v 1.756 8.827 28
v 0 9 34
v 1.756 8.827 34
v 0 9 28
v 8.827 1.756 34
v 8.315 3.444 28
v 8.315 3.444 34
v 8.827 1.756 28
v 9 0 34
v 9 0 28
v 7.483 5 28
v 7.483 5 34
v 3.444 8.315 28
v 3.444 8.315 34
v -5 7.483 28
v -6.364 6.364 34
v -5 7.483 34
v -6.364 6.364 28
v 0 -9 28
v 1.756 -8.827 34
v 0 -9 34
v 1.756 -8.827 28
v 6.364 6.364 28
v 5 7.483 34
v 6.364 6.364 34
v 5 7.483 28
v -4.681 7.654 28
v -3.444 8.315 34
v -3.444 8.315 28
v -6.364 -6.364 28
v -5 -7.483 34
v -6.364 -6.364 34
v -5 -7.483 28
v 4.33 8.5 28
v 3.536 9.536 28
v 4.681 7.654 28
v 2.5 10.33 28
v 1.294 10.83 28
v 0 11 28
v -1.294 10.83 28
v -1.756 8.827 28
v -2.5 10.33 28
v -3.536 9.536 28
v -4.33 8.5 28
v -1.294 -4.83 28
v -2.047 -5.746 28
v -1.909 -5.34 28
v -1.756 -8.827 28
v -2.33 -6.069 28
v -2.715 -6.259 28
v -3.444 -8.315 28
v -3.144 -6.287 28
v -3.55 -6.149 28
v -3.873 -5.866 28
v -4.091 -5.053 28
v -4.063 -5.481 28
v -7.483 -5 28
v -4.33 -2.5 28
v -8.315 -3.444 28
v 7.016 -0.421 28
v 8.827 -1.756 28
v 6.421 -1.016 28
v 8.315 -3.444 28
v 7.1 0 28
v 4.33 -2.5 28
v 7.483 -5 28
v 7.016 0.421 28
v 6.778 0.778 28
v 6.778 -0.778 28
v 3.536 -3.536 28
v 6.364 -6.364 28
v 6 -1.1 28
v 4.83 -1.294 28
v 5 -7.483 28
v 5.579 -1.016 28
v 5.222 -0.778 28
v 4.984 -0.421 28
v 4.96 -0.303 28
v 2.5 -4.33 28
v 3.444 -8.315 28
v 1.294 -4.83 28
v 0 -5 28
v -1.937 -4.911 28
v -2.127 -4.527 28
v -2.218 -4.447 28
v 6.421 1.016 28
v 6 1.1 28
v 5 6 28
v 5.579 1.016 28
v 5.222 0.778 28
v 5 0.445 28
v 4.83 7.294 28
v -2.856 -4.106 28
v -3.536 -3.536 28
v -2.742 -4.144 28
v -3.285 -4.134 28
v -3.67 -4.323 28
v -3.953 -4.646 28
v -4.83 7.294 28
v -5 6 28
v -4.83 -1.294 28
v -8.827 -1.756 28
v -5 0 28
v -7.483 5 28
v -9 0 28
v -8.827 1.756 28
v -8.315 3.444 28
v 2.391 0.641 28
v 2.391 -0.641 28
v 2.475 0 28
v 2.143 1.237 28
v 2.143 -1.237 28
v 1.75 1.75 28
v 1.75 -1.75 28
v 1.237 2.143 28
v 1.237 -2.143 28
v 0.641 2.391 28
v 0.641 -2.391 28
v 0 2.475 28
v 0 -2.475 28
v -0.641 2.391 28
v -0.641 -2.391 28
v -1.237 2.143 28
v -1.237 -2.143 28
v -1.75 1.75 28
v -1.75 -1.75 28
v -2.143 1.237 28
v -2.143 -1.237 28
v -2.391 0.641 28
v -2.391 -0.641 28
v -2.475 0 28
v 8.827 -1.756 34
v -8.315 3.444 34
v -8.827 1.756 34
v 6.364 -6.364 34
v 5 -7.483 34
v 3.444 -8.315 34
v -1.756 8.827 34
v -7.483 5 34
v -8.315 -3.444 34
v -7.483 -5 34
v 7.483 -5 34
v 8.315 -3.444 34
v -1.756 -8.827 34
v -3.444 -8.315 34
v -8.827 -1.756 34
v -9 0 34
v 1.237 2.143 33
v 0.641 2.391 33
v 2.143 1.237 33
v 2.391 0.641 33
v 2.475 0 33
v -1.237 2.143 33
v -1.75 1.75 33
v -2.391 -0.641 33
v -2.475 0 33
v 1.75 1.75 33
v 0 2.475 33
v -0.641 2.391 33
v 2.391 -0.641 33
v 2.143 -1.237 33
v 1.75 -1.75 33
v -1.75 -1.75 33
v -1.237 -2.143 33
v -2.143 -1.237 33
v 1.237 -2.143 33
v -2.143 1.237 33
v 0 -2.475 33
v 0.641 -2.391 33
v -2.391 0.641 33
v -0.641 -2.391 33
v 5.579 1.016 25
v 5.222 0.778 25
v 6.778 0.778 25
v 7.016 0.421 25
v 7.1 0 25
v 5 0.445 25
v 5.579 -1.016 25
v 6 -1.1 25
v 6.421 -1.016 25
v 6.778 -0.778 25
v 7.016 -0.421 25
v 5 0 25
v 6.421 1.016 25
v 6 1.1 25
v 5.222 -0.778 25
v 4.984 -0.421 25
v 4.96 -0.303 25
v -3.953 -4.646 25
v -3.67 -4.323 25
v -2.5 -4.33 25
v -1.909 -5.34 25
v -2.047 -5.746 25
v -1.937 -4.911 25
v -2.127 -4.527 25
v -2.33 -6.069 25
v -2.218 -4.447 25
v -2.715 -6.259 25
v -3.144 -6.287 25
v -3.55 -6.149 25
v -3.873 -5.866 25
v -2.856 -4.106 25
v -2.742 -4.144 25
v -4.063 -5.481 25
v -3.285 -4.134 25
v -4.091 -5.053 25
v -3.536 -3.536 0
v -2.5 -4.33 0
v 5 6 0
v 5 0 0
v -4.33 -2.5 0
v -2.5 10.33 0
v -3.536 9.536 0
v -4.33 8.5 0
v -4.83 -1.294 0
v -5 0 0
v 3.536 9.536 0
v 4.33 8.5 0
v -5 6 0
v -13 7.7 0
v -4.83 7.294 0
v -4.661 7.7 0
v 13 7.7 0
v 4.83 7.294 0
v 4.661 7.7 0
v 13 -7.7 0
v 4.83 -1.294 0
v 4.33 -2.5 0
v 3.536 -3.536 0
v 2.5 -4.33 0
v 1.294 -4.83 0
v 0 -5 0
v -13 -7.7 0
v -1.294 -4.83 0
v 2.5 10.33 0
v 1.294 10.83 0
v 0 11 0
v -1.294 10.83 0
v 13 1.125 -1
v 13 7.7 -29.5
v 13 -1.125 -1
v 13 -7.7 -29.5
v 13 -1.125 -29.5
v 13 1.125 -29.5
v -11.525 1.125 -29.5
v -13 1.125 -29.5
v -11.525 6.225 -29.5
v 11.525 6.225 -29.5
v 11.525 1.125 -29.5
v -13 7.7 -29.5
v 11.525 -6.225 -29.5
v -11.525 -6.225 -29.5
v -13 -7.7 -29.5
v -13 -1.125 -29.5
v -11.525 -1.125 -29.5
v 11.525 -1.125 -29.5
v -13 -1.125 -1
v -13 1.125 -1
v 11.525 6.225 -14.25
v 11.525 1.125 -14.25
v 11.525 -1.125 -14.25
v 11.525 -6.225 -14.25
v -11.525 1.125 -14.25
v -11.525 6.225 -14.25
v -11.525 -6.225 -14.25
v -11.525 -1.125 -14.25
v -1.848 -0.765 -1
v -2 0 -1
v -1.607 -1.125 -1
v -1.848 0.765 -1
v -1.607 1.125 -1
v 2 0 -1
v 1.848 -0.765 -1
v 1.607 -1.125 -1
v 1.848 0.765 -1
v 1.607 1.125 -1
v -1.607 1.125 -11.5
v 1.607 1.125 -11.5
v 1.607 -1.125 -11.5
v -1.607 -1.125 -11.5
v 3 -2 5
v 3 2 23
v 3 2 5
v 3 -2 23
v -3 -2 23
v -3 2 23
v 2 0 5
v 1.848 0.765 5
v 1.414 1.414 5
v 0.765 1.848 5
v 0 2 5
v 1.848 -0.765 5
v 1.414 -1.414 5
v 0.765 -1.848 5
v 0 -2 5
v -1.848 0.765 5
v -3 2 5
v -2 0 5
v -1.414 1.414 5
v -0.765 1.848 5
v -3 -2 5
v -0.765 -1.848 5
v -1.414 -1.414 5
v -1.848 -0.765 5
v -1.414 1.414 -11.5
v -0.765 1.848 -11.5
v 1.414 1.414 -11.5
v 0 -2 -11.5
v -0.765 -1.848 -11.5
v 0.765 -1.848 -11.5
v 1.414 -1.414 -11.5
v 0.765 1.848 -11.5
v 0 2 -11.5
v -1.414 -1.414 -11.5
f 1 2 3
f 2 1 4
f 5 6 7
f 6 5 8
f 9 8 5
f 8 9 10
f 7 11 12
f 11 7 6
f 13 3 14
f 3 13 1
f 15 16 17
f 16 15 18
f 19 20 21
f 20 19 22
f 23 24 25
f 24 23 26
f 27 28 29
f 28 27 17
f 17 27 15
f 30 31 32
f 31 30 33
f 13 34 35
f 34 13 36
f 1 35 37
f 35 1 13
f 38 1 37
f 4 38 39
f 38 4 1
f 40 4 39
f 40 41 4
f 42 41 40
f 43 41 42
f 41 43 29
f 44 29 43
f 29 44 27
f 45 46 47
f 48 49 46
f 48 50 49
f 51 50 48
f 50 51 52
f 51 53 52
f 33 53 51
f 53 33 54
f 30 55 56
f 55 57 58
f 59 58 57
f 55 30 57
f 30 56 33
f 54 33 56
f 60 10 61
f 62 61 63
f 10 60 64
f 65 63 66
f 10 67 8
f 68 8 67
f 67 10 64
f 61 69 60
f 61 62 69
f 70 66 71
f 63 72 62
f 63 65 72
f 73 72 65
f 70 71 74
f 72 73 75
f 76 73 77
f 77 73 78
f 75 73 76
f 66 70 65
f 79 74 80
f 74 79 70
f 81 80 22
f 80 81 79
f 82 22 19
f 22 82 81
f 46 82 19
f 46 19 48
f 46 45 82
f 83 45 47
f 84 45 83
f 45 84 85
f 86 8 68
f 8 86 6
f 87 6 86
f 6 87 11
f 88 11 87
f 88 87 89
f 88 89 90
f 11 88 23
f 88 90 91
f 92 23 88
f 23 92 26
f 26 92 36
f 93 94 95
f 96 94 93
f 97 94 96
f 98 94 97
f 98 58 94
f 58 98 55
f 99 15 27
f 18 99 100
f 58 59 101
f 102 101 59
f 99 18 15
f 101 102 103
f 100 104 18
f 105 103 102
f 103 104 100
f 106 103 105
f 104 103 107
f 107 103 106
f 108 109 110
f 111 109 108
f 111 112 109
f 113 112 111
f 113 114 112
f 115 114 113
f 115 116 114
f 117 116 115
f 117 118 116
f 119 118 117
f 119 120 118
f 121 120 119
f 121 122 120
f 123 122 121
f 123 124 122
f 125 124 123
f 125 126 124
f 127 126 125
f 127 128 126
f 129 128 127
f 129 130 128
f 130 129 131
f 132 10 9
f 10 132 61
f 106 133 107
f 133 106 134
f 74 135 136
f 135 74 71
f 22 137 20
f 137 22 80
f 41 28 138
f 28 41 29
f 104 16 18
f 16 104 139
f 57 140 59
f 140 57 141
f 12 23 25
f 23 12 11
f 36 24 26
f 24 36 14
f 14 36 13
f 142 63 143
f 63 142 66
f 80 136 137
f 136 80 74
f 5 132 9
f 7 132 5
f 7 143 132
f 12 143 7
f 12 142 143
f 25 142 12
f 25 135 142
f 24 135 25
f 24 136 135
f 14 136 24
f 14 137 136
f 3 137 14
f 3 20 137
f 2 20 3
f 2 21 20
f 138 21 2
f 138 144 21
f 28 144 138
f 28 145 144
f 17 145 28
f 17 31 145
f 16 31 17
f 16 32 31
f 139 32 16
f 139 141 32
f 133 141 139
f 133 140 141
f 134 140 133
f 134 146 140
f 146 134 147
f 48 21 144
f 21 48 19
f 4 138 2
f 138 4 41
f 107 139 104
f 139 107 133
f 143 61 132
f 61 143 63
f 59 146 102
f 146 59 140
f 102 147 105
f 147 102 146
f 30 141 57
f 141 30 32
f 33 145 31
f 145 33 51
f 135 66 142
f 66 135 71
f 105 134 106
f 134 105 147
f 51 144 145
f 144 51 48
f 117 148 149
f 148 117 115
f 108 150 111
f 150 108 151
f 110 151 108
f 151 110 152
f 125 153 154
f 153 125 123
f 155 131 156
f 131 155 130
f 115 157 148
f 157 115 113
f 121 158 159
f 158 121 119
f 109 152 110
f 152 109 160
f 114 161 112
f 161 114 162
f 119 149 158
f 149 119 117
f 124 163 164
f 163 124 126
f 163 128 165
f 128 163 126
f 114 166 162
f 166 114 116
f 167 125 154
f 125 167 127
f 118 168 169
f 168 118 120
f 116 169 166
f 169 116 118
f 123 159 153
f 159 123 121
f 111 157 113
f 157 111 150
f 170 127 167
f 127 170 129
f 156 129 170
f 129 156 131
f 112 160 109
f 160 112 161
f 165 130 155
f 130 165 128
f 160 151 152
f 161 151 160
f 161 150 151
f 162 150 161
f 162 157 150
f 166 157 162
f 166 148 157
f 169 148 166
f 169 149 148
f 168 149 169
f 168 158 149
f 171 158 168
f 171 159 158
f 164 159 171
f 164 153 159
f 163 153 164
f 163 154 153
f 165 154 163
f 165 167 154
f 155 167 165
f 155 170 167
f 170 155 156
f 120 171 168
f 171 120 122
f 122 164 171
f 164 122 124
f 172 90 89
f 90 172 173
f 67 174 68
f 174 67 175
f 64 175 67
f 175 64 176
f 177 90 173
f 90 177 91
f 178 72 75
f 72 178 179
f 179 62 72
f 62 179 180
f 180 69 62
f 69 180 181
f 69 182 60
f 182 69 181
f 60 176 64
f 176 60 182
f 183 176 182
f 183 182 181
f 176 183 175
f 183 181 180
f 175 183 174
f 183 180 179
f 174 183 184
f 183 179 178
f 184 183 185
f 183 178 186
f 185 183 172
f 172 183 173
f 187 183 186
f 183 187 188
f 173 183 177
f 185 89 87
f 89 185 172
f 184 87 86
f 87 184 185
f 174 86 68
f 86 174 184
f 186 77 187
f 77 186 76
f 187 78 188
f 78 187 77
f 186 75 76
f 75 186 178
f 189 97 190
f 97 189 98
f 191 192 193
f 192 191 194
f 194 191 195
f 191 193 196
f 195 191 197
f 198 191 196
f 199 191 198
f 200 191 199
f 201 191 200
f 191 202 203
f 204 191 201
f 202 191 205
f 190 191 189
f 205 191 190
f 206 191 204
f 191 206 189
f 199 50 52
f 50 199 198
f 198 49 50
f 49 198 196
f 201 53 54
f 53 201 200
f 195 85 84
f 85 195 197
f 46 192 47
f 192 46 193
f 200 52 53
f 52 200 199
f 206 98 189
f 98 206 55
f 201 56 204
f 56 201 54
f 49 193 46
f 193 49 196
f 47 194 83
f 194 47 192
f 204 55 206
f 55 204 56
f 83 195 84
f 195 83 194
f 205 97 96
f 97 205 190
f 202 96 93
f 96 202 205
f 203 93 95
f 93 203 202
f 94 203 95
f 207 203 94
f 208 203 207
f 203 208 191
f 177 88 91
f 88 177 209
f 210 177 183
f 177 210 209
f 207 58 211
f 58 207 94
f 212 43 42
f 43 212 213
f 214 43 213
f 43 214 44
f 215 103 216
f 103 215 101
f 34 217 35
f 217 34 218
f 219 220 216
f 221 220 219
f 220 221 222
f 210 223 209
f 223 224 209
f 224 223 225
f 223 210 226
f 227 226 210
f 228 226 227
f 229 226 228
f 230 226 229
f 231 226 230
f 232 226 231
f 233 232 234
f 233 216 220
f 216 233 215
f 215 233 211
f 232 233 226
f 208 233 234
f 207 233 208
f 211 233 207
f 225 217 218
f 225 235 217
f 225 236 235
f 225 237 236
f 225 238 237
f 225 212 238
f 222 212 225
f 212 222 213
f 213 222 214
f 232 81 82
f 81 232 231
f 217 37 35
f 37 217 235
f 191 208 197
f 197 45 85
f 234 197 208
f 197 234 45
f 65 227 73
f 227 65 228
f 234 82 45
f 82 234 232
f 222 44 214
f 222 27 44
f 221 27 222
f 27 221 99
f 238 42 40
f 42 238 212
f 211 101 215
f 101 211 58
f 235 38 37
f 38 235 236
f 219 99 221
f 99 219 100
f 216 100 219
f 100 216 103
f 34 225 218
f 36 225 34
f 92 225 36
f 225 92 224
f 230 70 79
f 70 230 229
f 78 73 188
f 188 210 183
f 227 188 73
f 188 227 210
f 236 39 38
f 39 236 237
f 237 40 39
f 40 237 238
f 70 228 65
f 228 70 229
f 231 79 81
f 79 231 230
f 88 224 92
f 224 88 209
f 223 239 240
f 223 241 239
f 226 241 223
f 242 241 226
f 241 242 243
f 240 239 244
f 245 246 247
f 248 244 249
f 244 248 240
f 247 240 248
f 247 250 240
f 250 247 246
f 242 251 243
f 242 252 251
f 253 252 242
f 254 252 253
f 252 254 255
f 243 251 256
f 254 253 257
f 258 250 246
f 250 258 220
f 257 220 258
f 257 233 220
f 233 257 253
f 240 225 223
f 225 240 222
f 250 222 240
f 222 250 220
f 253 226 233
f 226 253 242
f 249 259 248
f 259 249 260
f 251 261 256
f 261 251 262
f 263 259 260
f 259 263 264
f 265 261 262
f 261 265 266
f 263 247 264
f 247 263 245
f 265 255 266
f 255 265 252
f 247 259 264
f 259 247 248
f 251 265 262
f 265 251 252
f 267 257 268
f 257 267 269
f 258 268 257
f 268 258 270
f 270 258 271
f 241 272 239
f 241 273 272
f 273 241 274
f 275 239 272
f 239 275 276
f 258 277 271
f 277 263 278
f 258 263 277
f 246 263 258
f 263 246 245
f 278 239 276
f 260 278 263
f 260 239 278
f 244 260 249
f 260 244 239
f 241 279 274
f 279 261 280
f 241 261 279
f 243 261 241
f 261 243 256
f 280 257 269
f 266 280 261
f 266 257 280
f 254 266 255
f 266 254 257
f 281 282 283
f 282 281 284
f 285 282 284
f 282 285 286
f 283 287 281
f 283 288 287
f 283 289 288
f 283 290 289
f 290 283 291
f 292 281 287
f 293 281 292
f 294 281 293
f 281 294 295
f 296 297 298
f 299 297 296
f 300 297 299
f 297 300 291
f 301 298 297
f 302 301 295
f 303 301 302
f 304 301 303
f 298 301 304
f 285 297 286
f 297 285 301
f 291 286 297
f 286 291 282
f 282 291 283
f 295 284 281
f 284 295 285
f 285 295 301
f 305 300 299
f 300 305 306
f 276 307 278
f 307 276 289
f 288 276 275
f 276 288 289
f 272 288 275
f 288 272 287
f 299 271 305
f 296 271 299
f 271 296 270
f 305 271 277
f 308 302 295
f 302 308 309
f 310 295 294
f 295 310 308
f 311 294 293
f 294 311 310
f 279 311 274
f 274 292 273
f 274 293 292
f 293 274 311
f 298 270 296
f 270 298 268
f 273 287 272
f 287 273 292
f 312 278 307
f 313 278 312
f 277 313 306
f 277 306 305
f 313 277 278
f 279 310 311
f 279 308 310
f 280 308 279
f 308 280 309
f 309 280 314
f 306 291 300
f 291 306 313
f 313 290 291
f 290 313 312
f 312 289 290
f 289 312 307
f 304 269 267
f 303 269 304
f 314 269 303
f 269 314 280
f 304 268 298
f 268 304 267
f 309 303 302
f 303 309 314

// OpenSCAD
// file: config.scad
// PenguinBot - Print Configuration & Shared Utilities
// Units: mm | Tolerance for 3D printed parts

// ===== Print Parameters =====
LAYER_HEIGHT = 0.12;  // Appearance parts
WALL_THICKNESS = 1.6; // 3 perimeters @ 0.4mm nozzle → 1.2mm, add safety margin
CLEARANCE = 0.15;     // Hole compensation for FDM
TIGHT_FIT = 0.05;     // Press-fit tolerance
SLIP_FIT = 0.25;      // Sliding fit tolerance

// ===== MG90S Servo Dimensions =====
SERVO_BODY_W = 22.8;
SERVO_BODY_H = 12.2;
SERVO_BODY_D = 29.5;
SERVO_FLANGE_W = 32.2;
SERVO_FLANGE_H = 2.0;
SERVO_MOUNT_HOLE_SPACING = 27.0;
SERVO_MOUNT_HOLE_D = 2.0 + CLEARANCE;
SERVO_SPLINE_D = 4.8;
SERVO_SPLINE_OFFSET = 10.0;  // Spline center from top edge

// ===== N20 Motor Dimensions =====
N20_BODY_D = 24.4;
N20_BODY_L = 13.0;
N20_GEARBOX_D = 24.4;
N20_GEARBOX_L = 12.0;
N20_SHAFT_D = 3.0;
N20_SHAFT_L = 12.0;
N20_MOUNT_HOLE_SPACING = 17.0;
N20_MOUNT_HOLE_D = 2.5;

// ===== AS5600 Encoder =====
AS5600_PCB_W = 16.0;
AS5600_PCB_H = 12.7;
AS5600_PCB_T = 1.6;
MAGNET_D = 6.0;
MAGNET_H = 2.0;

// ===== Display =====
TFT_DISPLAY_W = 31.5;
TFT_DISPLAY_H = 43.5;
TFT_DISPLAY_T = 2.5;
TFT_ACTIVE_W = 24.0;
TFT_ACTIVE_H = 32.0;
TFT_PCB_W = 36.0;
TFT_PCB_H = 52.0;

// ===== Battery 2S 1500mAh (typical) =====
BATTERY_W = 35.0;
BATTERY_H = 18.0;
BATTERY_D = 70.0;

// ===== General Dimensions =====
BODY_W = 60.0;
BODY_D = 45.0;
BODY_H = 55.0;
HEAD_DIAMETER = 55.0;
HEAD_H = 40.0;
LEG_UPPER_L = 28.0;
LEG_LOWER_L = 32.0;
WHEEL_DIAMETER = 45.0;
WHEEL_WIDTH = 12.0;
ROBOT_TOTAL_H = 155.0;

// M2 / M3 fastener clearances
M2_CLEAR = 2.2;
M2_TAP = 1.6;
M2_NUT_D = 4.5;
M2_NUT_H = 1.8;
M3_CLEAR = 3.3;
M3_TAP = 2.5;

// ===== Utility Modules =====
module servo_cutout() {
    // Main body
    translate([0, 0, -SERVO_BODY_D/2])
        cube([SERVO_BODY_W + SLIP_FIT, SERVO_BODY_H + SLIP_FIT, SERVO_BODY_D + 1], center=true);
    // Flange
    translate([0, 0, -SERVO_FLANGE_H/2])
        cube([SERVO_FLANGE_W + SLIP_FIT, SERVO_FLANGE_H + SLIP_FIT, SERVO_BODY_D], center=true);
    // Mounting holes
    for (x = [-1, 1])
        translate([x * SERVO_MOUNT_HOLE_SPACING/2, 0, -SERVO_BODY_D/2])
            cylinder(d=SERVO_MOUNT_HOLE_D, h=SERVO_BODY_D + 2, center=true, $fn=16);
}

module n20_cutout() {
    union() {
        // Motor body
        cylinder(d=N20_BODY_D + SLIP_FIT, h=N20_BODY_L + 1, center=true, $fn=32);
        // Gearbox
        translate([0, 0, N20_BODY_L/2 + N20_GEARBOX_L/2])
            cylinder(d=N20_GEARBOX_D + SLIP_FIT, h=N20_GEARBOX_L + 0.5, center=true, $fn=32);
        // Mount holes
        for (x = [-1, 1])
            translate([x * N20_MOUNT_HOLE_SPACING/2, 0, 0])
                cylinder(d=N20_MOUNT_HOLE_D + CLEARANCE, h=30, center=true, $fn=16);
    }
}

// counterbore for M2 flat head screw
module m2_counterbore(length=10) {
    union() {
        cylinder(d=M2_CLEAR, h=length, center=false, $fn=16);
        translate([0, 0, length - 2.5])
            cylinder(d=4.5, h=3, center=false, $fn=16);
    }
}

// Hex nut trap (horizontal)
module m2_nut_trap() {
    cylinder(d=M2_NUT_D + 0.15, h=M2_NUT_H + 0.1, $fn=6);
}
// main file
// PenguinBot - Leg Segments
// Upper leg (thigh) + Lower leg (calf) with motor mount
include <config.scad>

// ===== Upper Leg (Thigh) =====
// Connects hip servo to knee servo
module leg_upper(side=1) {  // 1=right, -1=left
    difference() {
        union() {
            // Main body - rounded rectangle
            translate([0, 0, LEG_UPPER_L/2])
                hull() {
                    cylinder(d=10, h=LEG_UPPER_L, center=true, $fn=24);
                    translate([0, 6, 0])
                        cylinder(d=10, h=LEG_UPPER_L, center=true, $fn=24);
                }

            // Hip horn mount (top)
            translate([0, 0, LEG_UPPER_L]) {
                difference() {
                    cylinder(d=18, h=6, $fn=32);
                    // Spline
                    cylinder(d=SERVO_SPLINE_D + CLEARANCE, h=10, center=true, $fn=24);
                }
                // Horn screw holes
                for (a = [0, 120, 240])
                    rotate([0, 0, a])
                        translate([6, 0, 1])
                            cylinder(d=M2_CLEAR, h=8, center=true, $fn=16);
            }

            // Knee servo housing (bottom)
            translate([0, 0, -SERVO_BODY_D/2])
                cube([SERVO_BODY_W + WALL_THICKNESS*2,
                      SERVO_BODY_H + WALL_THICKNESS*2,
                      SERVO_BODY_D], center=true);
        }

        // Knee servo cavity
        translate([0, 0, -SERVO_BODY_D/2])
            servo_cutout();

        // Weight reduction
        translate([0, 0, LEG_UPPER_L/2])
            cube([6, 4, LEG_UPPER_L - 10], center=true);

        // Wire routing channel
        translate([0, 0, 5])
            cylinder(d=4, h=LEG_UPPER_L + 5, center=true, $fn=16);
    }
}

// ===== Lower Leg (Calf) =====
// Connects knee servo to N20 motor + wheel
module leg_lower(side=1) {
    difference() {
        union() {
            // Main body
            translate([0, 0, LEG_LOWER_L/2])
                hull() {
                    cylinder(d=10, h=LEG_LOWER_L, center=true, $fn=24);
                    translate([0, 4, 0])
                        cylinder(d=8, h=LEG_LOWER_L, center=true, $fn=24);
                }

            // Knee horn mount (top)
            translate([0, 0, LEG_LOWER_L]) {
                difference() {
                    cylinder(d=18, h=6, $fn=32);
                    cylinder(d=SERVO_SPLINE_D + CLEARANCE, h=10, center=true, $fn=24);
                }
                for (a = [0, 120, 240])
                    rotate([0, 0, a])
                        translate([6, 0, 1])
                            cylinder(d=M2_CLEAR, h=8, center=true, $fn=16);
            }

            // Motor housing (bottom)
            translate([0, N20_BODY_D/2 + 2, 0])
                rotate([0, 90, 90])
                hull() {
                    cylinder(d=N20_BODY_D + WALL_THICKNESS*2, h=N20_BODY_L + N20_GEARBOX_L + 4, center=true, $fn=32);
                    translate([0, 0, 0])
                        cylinder(d=N20_BODY_D + WALL_THICKNESS*2 + 4, h=N20_BODY_L + N20_GEARBOX_L + 4, center=true, $fn=32);
                }

            // Shaft support bearing boss
            translate([0, -N20_BODY_D/2 - 10, 0])
                cylinder(d=12, h=N20_BODY_L + N20_GEARBOX_L + 4, center=true, $fn=24);

            // Encoder PCB mount bracket
            translate([0, 0, -N20_BODY_L/2 - N20_GEARBOX_L/2 - 2])
                cube([AS5600_PCB_W + 4, 3, AS5600_PCB_H + 4], center=true);
        }

        // Motor cavity
        translate([0, N20_BODY_D/2 + 2, 0])
            rotate([0, 90, 90])
            n20_cutout();

        // Shaft through-hole
        translate([0, 0, 0])
            rotate([0, 90, 0])
            cylinder(d=N20_SHAFT_D + 0.3, h=40, center=true, $fn=16);

        // Encoder PCB slot
        translate([0, 0, -N20_BODY_L/2 - N20_GEARBOX_L/2 - 2])
            cube([AS5600_PCB_W + 0.3, 2, AS5600_PCB_T + 0.3], center=true);

        // Magnet recess
        translate([0, 1.5, 0])
            rotate([90, 0, 0])
            cylinder(d=MAGNET_D + 0.2, h=3, $fn=24);

        // Wire channel
        translate([0, 3, 10])
            cylinder(d=3, h=LEG_LOWER_L + 10, center=true, $fn=16);
    }
}

// ===== Hip Servo Bracket (mounts to body, holds hip servo) =====
module hip_bracket(side=1) {
    difference() {
        union() {
            // Mount plate
            cube([SERVO_BODY_D + 10, 20, 4], center=true);

            // Servo housing
            translate([0, 0, SERVO_BODY_W/2 + 2])
                cube([SERVO_BODY_D + 8, SERVO_BODY_H + WALL_THICKNESS*2, SERVO_BODY_W + 4], center=true);

            // Body mounting flange
            translate([0, side * 15, 0])
                cube([SERVO_BODY_D + 10, 8, 4], center=true);
        }

        // Servo cavity
        translate([0, 0, SERVO_BODY_W/2 + 2])
            rotate([90, 0, 0])
            servo_cutout();

        // Body mount holes
        for (x = [-SERVO_BODY_D/2, SERVO_BODY_D/2])
            translate([x, side * 15, 0])
                cylinder(d=M2_CLEAR, h=10, center=true, $fn=16);
    }
}

// Preview
leg_upper(1);
// leg_lower(1);
// hip_bracket(1);
